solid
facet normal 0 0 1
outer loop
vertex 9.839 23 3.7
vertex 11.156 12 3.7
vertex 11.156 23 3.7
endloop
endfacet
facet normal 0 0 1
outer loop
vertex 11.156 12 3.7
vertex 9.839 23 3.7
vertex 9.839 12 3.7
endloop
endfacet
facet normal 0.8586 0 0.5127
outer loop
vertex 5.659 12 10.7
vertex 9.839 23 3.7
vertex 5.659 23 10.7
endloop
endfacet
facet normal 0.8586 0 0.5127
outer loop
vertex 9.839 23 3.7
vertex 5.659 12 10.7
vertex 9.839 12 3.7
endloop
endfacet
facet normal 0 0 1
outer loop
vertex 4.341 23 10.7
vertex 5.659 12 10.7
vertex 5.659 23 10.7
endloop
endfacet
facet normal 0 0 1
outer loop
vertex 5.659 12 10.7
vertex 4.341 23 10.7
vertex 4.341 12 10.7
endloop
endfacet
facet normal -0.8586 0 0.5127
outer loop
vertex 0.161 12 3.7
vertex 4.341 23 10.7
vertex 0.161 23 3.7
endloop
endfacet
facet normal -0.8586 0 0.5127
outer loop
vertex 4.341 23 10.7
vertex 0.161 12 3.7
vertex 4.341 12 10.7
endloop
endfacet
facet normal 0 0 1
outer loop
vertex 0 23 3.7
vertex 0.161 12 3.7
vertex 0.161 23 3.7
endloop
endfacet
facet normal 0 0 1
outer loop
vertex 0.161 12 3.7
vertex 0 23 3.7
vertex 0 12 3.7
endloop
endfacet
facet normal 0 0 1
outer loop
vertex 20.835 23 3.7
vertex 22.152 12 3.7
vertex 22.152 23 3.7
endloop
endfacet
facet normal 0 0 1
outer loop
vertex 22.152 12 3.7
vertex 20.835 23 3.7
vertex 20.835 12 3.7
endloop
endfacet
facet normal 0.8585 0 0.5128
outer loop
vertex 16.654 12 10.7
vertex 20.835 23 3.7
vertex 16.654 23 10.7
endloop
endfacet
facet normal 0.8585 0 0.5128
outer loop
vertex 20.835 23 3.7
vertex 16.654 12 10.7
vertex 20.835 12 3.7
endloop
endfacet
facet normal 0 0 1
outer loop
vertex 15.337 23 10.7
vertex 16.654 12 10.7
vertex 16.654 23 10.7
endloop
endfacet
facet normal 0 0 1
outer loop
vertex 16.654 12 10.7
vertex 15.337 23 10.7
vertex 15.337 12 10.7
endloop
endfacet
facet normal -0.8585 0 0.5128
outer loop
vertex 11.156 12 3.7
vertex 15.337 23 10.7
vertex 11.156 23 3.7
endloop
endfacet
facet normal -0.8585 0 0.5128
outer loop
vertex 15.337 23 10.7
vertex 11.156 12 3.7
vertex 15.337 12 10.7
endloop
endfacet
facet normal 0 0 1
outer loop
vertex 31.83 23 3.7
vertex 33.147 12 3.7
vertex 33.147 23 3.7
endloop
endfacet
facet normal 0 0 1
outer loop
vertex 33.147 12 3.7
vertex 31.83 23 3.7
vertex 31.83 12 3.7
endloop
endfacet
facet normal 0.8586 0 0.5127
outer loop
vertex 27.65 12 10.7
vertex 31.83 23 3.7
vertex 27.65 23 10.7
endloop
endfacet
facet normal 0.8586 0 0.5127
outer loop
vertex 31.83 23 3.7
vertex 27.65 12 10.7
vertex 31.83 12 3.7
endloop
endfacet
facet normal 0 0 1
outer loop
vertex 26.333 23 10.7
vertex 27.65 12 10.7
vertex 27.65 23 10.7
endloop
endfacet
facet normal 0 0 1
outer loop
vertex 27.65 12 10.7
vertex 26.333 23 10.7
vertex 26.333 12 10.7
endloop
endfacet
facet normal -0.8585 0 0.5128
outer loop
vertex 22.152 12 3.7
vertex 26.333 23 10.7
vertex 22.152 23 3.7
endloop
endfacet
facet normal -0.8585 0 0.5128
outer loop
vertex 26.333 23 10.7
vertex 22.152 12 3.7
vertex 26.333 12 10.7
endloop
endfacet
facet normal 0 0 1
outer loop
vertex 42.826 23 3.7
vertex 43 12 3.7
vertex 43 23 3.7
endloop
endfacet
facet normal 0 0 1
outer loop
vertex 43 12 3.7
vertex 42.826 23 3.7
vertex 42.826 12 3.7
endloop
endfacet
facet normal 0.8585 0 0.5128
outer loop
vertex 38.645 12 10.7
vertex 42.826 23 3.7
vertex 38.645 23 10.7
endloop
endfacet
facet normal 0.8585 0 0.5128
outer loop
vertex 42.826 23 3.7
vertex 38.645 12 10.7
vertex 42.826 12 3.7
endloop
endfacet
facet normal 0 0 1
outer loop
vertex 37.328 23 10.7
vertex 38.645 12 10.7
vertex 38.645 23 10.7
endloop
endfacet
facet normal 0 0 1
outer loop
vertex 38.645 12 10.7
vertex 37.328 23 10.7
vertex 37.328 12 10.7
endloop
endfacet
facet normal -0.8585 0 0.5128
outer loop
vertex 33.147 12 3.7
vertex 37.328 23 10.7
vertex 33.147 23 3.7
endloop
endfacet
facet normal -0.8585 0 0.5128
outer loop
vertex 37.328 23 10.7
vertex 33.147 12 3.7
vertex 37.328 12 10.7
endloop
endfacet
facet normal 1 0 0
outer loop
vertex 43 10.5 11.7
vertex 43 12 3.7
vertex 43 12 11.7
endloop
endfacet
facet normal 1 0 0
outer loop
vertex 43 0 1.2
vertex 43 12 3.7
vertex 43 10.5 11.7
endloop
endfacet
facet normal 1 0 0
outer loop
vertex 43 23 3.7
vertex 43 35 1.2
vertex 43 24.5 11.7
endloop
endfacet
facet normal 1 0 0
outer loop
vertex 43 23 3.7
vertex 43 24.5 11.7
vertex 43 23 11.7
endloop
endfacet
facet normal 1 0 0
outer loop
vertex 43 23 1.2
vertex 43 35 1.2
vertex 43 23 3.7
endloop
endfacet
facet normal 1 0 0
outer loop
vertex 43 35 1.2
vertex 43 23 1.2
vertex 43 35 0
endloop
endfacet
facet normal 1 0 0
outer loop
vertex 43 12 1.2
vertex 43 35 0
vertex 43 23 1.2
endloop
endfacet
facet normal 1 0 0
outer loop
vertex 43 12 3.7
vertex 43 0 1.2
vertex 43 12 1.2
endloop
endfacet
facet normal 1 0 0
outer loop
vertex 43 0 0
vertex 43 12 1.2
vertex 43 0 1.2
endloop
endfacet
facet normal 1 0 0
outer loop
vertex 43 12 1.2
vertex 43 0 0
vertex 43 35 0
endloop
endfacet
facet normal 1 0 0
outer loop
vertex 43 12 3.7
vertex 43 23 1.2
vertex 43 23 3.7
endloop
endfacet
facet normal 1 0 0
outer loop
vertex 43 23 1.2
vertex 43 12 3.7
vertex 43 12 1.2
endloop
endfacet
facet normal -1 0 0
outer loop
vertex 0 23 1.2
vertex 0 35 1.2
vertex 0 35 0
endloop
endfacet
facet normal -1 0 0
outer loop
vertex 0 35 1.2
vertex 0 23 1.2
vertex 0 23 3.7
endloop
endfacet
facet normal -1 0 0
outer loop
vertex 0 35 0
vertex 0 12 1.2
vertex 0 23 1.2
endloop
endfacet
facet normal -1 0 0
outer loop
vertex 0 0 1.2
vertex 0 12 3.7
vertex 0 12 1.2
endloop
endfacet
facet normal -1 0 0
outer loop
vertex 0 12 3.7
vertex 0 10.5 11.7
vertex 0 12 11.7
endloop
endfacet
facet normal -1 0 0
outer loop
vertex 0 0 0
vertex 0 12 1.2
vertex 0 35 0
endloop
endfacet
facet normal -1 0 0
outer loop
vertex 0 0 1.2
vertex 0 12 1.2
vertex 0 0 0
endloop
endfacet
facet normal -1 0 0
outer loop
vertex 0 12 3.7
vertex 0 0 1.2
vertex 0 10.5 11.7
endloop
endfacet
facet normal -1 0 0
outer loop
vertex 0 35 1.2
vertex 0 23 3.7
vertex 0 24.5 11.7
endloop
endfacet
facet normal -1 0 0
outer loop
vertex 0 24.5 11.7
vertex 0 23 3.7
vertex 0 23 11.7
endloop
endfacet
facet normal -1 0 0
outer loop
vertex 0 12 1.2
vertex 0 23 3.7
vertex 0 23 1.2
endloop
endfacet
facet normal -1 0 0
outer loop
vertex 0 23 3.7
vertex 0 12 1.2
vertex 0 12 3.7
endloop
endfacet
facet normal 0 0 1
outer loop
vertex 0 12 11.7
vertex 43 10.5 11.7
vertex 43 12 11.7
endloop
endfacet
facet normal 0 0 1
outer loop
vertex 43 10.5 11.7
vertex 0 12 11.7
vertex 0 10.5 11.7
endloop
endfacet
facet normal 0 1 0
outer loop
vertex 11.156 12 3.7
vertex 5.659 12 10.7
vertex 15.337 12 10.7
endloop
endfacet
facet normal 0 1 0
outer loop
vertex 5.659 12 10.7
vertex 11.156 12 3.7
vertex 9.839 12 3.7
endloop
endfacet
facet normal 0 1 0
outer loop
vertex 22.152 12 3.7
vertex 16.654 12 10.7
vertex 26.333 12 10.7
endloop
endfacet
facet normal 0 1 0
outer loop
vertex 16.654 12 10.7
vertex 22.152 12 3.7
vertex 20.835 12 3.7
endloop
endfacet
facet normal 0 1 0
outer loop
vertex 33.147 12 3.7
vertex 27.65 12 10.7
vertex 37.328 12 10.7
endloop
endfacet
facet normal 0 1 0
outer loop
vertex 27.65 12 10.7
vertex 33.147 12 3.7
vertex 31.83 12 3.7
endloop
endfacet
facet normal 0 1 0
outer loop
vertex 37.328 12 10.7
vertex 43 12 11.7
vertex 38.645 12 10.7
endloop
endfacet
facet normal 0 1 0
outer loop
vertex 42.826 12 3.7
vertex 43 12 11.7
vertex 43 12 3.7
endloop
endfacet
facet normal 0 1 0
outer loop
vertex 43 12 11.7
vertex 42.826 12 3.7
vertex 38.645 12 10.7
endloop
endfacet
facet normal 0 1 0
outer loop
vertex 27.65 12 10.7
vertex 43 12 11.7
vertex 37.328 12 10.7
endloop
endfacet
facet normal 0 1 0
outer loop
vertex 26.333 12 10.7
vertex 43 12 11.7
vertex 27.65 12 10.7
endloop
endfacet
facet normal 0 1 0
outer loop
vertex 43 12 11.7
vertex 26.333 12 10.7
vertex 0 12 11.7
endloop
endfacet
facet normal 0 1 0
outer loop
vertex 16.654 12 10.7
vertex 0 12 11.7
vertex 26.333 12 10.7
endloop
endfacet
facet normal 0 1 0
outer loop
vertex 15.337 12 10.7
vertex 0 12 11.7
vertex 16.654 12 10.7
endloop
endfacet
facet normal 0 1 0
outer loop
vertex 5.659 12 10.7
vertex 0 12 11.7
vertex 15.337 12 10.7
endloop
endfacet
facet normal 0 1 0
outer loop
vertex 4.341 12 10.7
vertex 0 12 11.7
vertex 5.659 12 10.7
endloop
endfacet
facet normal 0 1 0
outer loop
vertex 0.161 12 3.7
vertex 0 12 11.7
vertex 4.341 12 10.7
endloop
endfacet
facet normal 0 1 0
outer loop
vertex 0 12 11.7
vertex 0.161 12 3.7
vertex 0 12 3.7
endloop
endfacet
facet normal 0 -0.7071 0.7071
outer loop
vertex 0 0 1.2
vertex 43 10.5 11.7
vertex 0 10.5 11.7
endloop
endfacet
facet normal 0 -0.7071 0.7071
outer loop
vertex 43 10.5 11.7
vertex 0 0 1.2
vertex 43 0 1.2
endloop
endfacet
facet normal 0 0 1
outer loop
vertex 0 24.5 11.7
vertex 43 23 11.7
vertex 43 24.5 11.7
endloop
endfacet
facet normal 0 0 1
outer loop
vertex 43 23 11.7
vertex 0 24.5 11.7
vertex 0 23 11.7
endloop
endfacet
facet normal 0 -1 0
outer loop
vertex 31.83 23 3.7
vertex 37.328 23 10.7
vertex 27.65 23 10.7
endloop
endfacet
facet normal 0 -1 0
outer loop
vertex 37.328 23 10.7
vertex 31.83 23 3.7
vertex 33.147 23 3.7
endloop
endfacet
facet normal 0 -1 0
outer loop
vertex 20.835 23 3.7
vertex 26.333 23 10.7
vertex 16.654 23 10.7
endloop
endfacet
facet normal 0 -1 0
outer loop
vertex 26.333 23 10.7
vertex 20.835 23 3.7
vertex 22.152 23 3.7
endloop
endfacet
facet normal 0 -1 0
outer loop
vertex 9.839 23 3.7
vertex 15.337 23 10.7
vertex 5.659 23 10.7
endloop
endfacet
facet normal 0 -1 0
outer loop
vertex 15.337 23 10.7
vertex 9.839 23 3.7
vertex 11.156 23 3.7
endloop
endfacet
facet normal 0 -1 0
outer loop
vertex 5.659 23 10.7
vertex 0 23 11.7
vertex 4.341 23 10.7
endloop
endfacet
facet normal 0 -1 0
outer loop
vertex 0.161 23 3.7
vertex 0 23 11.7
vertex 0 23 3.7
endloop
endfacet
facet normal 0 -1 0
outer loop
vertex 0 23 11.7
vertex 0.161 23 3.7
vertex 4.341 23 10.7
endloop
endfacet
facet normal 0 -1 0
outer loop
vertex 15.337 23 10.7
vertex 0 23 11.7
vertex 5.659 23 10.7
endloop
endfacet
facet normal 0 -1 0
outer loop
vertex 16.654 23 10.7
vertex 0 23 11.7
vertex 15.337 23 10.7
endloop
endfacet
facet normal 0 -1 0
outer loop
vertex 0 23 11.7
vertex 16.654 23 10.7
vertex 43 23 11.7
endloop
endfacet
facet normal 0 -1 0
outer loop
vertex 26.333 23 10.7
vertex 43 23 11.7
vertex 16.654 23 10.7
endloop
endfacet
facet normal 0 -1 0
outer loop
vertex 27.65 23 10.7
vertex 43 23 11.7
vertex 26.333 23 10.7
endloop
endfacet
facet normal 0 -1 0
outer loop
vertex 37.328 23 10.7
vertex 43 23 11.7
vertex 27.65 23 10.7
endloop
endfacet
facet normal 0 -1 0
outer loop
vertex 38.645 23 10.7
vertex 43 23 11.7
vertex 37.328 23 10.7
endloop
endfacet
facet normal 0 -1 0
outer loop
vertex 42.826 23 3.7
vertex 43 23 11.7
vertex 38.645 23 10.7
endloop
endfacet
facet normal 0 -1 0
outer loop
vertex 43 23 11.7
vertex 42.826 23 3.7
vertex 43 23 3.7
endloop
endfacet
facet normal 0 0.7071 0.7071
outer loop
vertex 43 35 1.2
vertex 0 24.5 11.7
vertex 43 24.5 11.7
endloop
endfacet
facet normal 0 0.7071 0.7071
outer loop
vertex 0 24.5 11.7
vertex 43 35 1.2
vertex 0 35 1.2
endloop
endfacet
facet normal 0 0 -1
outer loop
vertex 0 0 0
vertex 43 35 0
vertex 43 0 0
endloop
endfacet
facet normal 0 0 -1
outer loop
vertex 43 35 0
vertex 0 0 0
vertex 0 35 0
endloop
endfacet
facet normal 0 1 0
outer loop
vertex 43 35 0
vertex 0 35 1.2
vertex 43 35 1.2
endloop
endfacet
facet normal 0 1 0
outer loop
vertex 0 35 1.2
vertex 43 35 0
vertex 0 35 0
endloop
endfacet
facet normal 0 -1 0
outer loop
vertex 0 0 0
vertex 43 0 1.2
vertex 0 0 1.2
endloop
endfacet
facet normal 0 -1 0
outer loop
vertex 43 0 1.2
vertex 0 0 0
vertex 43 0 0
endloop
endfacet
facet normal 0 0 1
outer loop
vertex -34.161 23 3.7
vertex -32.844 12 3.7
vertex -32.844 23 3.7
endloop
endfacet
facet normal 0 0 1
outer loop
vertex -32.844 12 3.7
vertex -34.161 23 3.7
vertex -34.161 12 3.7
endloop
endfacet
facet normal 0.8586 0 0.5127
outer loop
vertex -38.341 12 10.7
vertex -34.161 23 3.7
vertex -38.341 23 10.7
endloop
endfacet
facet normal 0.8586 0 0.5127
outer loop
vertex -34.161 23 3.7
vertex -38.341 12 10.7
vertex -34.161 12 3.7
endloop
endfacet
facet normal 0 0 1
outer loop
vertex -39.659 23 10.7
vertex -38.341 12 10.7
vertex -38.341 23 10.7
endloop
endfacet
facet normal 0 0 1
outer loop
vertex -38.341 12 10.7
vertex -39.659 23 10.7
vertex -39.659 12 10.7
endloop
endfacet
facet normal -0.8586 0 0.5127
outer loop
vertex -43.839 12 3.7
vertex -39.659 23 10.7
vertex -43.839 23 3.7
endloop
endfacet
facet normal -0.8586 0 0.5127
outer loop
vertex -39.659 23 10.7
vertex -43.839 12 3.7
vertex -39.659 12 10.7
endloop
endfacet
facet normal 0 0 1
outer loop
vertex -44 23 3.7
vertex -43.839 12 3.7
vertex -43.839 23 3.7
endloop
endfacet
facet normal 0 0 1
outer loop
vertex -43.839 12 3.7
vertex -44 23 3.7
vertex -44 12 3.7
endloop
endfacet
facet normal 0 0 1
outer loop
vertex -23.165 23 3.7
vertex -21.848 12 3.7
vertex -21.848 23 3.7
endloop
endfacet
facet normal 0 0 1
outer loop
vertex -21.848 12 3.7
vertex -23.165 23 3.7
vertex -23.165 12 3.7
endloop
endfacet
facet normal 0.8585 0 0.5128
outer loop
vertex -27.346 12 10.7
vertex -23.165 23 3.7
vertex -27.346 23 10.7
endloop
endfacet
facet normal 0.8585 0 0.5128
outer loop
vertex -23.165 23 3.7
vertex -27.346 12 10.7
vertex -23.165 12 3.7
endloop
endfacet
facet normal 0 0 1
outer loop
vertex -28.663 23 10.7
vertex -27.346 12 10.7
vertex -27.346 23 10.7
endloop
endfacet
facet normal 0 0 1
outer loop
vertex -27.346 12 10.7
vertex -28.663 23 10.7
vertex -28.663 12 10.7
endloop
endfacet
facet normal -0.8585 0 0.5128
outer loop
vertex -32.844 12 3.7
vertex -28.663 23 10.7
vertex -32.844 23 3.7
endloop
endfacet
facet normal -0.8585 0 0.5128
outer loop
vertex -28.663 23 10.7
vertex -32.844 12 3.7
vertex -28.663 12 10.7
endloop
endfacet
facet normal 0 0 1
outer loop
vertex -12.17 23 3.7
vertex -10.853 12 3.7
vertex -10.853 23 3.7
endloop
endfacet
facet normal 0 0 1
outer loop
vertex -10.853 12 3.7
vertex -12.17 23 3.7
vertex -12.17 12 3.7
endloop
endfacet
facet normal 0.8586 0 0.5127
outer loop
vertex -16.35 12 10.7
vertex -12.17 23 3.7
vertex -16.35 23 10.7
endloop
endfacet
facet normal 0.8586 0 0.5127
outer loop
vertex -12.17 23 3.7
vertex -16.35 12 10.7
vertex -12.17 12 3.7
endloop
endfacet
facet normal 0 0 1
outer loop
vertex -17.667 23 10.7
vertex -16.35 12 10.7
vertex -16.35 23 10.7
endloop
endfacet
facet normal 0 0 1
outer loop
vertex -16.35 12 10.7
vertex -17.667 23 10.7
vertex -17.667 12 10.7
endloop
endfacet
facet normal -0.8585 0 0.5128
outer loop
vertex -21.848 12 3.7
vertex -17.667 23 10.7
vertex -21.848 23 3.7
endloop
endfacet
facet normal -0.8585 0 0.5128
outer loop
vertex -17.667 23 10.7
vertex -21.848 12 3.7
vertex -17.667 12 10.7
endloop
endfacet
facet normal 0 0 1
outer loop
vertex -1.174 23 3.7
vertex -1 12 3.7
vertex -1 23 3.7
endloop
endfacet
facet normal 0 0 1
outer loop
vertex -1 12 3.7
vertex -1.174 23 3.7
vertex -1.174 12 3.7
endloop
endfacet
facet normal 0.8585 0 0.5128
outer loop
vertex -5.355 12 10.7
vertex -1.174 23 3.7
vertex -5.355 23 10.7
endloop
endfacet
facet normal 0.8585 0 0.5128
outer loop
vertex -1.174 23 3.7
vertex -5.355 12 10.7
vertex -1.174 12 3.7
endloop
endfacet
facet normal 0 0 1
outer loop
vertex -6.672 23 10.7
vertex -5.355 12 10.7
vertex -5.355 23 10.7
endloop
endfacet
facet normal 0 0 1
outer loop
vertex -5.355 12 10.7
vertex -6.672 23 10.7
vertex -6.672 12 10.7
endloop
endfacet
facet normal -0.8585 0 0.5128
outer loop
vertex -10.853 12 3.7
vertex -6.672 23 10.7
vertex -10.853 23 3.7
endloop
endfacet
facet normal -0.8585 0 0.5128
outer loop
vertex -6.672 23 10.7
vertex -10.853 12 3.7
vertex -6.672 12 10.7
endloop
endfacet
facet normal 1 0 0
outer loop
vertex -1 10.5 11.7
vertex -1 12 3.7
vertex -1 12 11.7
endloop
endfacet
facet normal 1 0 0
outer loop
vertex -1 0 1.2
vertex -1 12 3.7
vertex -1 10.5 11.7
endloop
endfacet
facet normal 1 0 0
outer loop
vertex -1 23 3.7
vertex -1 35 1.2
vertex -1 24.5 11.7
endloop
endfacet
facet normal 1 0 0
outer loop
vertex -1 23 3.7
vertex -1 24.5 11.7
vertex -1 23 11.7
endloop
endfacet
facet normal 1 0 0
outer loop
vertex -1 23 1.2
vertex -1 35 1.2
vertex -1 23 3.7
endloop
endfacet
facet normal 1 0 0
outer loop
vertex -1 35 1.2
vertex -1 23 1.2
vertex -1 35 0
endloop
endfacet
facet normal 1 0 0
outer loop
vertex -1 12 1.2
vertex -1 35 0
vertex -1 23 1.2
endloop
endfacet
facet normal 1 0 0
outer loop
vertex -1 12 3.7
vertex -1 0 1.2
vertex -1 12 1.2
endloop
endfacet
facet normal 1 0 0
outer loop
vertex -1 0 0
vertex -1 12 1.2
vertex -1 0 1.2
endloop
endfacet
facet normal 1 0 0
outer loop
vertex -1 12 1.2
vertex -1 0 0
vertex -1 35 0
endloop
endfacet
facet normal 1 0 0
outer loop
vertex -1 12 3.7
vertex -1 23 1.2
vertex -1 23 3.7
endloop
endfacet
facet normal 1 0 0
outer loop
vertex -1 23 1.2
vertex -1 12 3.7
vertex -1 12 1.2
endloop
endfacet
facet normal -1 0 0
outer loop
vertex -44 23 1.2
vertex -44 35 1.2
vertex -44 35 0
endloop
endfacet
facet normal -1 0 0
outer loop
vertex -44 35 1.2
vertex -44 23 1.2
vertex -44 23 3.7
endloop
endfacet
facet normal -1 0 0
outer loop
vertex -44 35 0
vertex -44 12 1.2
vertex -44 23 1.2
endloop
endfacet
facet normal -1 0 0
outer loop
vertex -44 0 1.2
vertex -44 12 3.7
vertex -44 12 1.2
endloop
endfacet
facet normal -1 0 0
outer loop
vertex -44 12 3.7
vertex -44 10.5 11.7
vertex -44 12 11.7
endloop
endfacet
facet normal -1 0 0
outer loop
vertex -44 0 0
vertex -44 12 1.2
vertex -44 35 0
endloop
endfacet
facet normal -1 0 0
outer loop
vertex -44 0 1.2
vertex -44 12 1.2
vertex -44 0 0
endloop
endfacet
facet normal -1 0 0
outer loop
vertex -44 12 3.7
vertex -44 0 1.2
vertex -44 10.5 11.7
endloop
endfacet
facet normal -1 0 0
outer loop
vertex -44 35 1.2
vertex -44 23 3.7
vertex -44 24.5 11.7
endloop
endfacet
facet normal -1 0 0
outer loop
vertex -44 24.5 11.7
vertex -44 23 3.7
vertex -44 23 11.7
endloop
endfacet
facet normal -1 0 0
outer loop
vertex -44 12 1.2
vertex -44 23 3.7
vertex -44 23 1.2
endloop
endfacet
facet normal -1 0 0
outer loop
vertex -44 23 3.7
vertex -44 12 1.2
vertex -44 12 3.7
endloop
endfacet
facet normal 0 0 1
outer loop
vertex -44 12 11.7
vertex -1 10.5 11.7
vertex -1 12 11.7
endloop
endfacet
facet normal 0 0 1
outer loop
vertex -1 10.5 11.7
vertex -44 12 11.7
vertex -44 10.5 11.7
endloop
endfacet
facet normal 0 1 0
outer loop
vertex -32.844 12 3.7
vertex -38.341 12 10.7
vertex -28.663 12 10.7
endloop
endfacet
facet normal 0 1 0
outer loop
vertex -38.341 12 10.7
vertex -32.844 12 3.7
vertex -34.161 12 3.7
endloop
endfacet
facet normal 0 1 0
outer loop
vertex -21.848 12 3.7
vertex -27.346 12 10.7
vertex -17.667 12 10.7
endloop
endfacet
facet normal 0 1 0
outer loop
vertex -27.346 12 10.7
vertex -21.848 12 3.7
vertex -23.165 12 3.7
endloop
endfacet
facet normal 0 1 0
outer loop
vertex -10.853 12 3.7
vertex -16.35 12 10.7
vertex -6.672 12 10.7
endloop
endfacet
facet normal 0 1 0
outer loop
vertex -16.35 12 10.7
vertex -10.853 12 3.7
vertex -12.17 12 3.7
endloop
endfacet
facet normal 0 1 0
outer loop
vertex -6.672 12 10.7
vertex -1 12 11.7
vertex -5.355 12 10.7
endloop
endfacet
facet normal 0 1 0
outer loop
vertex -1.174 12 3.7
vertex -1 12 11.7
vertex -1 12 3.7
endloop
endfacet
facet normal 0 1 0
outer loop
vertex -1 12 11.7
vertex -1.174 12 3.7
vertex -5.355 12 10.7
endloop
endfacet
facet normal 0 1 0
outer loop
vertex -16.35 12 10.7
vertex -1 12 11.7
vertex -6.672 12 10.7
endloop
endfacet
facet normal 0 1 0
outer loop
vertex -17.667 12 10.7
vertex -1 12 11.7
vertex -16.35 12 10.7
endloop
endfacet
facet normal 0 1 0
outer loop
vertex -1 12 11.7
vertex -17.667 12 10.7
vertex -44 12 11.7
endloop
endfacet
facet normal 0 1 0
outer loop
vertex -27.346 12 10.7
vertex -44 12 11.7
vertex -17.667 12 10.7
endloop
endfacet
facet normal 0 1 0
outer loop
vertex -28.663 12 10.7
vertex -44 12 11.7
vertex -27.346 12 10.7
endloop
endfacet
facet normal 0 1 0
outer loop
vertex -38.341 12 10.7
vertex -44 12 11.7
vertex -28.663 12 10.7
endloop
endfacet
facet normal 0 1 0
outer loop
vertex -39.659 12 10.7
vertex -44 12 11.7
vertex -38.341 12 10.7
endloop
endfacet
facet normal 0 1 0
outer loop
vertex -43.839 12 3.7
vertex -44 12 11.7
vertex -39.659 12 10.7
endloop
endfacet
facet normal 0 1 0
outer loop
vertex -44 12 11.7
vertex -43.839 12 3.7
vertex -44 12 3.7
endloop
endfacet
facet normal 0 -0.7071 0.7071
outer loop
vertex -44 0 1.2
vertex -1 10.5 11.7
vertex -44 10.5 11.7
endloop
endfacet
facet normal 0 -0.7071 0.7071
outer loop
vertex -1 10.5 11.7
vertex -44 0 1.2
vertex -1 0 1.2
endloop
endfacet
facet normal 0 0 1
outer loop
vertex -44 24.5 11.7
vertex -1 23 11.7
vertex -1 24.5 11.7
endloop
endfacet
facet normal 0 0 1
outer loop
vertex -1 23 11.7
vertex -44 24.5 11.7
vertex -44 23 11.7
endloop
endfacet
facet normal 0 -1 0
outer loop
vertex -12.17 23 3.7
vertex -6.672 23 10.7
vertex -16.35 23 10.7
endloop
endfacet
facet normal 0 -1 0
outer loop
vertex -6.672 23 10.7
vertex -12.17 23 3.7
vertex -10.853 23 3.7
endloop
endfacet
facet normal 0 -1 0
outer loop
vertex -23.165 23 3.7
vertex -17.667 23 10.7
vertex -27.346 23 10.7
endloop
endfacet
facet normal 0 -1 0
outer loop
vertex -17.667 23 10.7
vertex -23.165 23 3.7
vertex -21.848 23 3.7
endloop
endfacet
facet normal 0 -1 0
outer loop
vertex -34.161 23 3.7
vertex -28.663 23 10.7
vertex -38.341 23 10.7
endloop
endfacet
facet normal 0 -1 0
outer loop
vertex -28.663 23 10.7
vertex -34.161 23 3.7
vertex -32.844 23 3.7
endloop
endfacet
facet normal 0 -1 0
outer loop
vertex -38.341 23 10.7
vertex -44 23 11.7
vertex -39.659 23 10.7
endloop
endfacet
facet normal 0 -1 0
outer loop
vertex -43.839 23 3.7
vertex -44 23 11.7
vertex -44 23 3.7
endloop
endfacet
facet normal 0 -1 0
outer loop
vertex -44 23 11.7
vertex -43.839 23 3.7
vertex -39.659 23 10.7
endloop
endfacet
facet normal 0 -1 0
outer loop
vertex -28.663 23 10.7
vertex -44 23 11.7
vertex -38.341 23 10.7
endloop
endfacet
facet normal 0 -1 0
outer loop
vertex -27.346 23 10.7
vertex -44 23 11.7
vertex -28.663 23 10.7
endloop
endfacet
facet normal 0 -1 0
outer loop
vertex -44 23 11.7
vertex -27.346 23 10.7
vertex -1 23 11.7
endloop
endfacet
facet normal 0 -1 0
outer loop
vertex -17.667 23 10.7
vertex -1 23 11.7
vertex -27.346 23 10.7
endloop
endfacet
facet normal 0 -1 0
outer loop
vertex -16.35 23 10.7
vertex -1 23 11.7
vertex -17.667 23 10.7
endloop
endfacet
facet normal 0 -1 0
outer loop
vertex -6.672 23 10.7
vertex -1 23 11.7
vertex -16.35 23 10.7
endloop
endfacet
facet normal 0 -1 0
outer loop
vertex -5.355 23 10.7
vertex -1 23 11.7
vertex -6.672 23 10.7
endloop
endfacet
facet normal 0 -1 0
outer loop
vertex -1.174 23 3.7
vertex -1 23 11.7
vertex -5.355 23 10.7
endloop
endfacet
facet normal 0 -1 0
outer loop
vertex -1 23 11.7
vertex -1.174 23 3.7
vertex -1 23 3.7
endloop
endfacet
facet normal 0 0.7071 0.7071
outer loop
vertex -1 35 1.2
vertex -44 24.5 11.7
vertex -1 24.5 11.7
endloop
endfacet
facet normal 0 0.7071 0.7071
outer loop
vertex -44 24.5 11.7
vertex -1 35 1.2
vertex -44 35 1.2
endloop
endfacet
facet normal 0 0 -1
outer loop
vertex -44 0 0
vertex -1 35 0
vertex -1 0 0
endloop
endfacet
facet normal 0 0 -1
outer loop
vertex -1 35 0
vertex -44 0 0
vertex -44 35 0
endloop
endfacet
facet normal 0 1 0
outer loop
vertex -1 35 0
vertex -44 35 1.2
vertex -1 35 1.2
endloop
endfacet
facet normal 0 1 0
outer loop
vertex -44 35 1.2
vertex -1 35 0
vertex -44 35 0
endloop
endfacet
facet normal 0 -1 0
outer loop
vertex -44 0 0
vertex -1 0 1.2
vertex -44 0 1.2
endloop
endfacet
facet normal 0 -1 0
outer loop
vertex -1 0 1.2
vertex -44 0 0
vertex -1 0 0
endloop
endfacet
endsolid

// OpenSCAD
include <../../libs/publicDomainGearV1.1.scad>




module track_piece(){
    x = 43;
    y = 35;
    z= 1.2;


    union(){
       cube([x,y,z]);

       // cut the ends off the rack
       translate([5,y/2,z+6]) difference(){
           rotate([90,0,0]) color([0.75,0.75,0.75]) rack(mm_per_tooth=3.5*3.14159,height=10, thickness=12, number_of_teeth=4);
           translate([38,-10,-7]) cube(size=[10,20,5]);
           translate([-15,-10,-7]) cube(size=[10,20,5]);
       }
       
       // bearing slides
       difference(){
           translate([0,0,z]) cube([x,12,10.5]);
           translate([-1,0,z]) rotate([45,0,0]) cube([x+5,15+1,10]);     
       }
       difference(){
           translate([0,23,z]) cube([x,12,10.5]);
           translate([-1,24,z+11]) rotate([-45,0,0]) cube([x+5,15+1,10]);     
       }

    }

}
track_piece();
translate([-44,0,0]) track_piece();

//translate([0,17.5,32]) rotate([0,90,90]) color([1.00,0.75,0.75]) gear(mm_per_tooth=3.5*3.14159,thickness=10,number_of_teeth=12,hole_diameter=5);
